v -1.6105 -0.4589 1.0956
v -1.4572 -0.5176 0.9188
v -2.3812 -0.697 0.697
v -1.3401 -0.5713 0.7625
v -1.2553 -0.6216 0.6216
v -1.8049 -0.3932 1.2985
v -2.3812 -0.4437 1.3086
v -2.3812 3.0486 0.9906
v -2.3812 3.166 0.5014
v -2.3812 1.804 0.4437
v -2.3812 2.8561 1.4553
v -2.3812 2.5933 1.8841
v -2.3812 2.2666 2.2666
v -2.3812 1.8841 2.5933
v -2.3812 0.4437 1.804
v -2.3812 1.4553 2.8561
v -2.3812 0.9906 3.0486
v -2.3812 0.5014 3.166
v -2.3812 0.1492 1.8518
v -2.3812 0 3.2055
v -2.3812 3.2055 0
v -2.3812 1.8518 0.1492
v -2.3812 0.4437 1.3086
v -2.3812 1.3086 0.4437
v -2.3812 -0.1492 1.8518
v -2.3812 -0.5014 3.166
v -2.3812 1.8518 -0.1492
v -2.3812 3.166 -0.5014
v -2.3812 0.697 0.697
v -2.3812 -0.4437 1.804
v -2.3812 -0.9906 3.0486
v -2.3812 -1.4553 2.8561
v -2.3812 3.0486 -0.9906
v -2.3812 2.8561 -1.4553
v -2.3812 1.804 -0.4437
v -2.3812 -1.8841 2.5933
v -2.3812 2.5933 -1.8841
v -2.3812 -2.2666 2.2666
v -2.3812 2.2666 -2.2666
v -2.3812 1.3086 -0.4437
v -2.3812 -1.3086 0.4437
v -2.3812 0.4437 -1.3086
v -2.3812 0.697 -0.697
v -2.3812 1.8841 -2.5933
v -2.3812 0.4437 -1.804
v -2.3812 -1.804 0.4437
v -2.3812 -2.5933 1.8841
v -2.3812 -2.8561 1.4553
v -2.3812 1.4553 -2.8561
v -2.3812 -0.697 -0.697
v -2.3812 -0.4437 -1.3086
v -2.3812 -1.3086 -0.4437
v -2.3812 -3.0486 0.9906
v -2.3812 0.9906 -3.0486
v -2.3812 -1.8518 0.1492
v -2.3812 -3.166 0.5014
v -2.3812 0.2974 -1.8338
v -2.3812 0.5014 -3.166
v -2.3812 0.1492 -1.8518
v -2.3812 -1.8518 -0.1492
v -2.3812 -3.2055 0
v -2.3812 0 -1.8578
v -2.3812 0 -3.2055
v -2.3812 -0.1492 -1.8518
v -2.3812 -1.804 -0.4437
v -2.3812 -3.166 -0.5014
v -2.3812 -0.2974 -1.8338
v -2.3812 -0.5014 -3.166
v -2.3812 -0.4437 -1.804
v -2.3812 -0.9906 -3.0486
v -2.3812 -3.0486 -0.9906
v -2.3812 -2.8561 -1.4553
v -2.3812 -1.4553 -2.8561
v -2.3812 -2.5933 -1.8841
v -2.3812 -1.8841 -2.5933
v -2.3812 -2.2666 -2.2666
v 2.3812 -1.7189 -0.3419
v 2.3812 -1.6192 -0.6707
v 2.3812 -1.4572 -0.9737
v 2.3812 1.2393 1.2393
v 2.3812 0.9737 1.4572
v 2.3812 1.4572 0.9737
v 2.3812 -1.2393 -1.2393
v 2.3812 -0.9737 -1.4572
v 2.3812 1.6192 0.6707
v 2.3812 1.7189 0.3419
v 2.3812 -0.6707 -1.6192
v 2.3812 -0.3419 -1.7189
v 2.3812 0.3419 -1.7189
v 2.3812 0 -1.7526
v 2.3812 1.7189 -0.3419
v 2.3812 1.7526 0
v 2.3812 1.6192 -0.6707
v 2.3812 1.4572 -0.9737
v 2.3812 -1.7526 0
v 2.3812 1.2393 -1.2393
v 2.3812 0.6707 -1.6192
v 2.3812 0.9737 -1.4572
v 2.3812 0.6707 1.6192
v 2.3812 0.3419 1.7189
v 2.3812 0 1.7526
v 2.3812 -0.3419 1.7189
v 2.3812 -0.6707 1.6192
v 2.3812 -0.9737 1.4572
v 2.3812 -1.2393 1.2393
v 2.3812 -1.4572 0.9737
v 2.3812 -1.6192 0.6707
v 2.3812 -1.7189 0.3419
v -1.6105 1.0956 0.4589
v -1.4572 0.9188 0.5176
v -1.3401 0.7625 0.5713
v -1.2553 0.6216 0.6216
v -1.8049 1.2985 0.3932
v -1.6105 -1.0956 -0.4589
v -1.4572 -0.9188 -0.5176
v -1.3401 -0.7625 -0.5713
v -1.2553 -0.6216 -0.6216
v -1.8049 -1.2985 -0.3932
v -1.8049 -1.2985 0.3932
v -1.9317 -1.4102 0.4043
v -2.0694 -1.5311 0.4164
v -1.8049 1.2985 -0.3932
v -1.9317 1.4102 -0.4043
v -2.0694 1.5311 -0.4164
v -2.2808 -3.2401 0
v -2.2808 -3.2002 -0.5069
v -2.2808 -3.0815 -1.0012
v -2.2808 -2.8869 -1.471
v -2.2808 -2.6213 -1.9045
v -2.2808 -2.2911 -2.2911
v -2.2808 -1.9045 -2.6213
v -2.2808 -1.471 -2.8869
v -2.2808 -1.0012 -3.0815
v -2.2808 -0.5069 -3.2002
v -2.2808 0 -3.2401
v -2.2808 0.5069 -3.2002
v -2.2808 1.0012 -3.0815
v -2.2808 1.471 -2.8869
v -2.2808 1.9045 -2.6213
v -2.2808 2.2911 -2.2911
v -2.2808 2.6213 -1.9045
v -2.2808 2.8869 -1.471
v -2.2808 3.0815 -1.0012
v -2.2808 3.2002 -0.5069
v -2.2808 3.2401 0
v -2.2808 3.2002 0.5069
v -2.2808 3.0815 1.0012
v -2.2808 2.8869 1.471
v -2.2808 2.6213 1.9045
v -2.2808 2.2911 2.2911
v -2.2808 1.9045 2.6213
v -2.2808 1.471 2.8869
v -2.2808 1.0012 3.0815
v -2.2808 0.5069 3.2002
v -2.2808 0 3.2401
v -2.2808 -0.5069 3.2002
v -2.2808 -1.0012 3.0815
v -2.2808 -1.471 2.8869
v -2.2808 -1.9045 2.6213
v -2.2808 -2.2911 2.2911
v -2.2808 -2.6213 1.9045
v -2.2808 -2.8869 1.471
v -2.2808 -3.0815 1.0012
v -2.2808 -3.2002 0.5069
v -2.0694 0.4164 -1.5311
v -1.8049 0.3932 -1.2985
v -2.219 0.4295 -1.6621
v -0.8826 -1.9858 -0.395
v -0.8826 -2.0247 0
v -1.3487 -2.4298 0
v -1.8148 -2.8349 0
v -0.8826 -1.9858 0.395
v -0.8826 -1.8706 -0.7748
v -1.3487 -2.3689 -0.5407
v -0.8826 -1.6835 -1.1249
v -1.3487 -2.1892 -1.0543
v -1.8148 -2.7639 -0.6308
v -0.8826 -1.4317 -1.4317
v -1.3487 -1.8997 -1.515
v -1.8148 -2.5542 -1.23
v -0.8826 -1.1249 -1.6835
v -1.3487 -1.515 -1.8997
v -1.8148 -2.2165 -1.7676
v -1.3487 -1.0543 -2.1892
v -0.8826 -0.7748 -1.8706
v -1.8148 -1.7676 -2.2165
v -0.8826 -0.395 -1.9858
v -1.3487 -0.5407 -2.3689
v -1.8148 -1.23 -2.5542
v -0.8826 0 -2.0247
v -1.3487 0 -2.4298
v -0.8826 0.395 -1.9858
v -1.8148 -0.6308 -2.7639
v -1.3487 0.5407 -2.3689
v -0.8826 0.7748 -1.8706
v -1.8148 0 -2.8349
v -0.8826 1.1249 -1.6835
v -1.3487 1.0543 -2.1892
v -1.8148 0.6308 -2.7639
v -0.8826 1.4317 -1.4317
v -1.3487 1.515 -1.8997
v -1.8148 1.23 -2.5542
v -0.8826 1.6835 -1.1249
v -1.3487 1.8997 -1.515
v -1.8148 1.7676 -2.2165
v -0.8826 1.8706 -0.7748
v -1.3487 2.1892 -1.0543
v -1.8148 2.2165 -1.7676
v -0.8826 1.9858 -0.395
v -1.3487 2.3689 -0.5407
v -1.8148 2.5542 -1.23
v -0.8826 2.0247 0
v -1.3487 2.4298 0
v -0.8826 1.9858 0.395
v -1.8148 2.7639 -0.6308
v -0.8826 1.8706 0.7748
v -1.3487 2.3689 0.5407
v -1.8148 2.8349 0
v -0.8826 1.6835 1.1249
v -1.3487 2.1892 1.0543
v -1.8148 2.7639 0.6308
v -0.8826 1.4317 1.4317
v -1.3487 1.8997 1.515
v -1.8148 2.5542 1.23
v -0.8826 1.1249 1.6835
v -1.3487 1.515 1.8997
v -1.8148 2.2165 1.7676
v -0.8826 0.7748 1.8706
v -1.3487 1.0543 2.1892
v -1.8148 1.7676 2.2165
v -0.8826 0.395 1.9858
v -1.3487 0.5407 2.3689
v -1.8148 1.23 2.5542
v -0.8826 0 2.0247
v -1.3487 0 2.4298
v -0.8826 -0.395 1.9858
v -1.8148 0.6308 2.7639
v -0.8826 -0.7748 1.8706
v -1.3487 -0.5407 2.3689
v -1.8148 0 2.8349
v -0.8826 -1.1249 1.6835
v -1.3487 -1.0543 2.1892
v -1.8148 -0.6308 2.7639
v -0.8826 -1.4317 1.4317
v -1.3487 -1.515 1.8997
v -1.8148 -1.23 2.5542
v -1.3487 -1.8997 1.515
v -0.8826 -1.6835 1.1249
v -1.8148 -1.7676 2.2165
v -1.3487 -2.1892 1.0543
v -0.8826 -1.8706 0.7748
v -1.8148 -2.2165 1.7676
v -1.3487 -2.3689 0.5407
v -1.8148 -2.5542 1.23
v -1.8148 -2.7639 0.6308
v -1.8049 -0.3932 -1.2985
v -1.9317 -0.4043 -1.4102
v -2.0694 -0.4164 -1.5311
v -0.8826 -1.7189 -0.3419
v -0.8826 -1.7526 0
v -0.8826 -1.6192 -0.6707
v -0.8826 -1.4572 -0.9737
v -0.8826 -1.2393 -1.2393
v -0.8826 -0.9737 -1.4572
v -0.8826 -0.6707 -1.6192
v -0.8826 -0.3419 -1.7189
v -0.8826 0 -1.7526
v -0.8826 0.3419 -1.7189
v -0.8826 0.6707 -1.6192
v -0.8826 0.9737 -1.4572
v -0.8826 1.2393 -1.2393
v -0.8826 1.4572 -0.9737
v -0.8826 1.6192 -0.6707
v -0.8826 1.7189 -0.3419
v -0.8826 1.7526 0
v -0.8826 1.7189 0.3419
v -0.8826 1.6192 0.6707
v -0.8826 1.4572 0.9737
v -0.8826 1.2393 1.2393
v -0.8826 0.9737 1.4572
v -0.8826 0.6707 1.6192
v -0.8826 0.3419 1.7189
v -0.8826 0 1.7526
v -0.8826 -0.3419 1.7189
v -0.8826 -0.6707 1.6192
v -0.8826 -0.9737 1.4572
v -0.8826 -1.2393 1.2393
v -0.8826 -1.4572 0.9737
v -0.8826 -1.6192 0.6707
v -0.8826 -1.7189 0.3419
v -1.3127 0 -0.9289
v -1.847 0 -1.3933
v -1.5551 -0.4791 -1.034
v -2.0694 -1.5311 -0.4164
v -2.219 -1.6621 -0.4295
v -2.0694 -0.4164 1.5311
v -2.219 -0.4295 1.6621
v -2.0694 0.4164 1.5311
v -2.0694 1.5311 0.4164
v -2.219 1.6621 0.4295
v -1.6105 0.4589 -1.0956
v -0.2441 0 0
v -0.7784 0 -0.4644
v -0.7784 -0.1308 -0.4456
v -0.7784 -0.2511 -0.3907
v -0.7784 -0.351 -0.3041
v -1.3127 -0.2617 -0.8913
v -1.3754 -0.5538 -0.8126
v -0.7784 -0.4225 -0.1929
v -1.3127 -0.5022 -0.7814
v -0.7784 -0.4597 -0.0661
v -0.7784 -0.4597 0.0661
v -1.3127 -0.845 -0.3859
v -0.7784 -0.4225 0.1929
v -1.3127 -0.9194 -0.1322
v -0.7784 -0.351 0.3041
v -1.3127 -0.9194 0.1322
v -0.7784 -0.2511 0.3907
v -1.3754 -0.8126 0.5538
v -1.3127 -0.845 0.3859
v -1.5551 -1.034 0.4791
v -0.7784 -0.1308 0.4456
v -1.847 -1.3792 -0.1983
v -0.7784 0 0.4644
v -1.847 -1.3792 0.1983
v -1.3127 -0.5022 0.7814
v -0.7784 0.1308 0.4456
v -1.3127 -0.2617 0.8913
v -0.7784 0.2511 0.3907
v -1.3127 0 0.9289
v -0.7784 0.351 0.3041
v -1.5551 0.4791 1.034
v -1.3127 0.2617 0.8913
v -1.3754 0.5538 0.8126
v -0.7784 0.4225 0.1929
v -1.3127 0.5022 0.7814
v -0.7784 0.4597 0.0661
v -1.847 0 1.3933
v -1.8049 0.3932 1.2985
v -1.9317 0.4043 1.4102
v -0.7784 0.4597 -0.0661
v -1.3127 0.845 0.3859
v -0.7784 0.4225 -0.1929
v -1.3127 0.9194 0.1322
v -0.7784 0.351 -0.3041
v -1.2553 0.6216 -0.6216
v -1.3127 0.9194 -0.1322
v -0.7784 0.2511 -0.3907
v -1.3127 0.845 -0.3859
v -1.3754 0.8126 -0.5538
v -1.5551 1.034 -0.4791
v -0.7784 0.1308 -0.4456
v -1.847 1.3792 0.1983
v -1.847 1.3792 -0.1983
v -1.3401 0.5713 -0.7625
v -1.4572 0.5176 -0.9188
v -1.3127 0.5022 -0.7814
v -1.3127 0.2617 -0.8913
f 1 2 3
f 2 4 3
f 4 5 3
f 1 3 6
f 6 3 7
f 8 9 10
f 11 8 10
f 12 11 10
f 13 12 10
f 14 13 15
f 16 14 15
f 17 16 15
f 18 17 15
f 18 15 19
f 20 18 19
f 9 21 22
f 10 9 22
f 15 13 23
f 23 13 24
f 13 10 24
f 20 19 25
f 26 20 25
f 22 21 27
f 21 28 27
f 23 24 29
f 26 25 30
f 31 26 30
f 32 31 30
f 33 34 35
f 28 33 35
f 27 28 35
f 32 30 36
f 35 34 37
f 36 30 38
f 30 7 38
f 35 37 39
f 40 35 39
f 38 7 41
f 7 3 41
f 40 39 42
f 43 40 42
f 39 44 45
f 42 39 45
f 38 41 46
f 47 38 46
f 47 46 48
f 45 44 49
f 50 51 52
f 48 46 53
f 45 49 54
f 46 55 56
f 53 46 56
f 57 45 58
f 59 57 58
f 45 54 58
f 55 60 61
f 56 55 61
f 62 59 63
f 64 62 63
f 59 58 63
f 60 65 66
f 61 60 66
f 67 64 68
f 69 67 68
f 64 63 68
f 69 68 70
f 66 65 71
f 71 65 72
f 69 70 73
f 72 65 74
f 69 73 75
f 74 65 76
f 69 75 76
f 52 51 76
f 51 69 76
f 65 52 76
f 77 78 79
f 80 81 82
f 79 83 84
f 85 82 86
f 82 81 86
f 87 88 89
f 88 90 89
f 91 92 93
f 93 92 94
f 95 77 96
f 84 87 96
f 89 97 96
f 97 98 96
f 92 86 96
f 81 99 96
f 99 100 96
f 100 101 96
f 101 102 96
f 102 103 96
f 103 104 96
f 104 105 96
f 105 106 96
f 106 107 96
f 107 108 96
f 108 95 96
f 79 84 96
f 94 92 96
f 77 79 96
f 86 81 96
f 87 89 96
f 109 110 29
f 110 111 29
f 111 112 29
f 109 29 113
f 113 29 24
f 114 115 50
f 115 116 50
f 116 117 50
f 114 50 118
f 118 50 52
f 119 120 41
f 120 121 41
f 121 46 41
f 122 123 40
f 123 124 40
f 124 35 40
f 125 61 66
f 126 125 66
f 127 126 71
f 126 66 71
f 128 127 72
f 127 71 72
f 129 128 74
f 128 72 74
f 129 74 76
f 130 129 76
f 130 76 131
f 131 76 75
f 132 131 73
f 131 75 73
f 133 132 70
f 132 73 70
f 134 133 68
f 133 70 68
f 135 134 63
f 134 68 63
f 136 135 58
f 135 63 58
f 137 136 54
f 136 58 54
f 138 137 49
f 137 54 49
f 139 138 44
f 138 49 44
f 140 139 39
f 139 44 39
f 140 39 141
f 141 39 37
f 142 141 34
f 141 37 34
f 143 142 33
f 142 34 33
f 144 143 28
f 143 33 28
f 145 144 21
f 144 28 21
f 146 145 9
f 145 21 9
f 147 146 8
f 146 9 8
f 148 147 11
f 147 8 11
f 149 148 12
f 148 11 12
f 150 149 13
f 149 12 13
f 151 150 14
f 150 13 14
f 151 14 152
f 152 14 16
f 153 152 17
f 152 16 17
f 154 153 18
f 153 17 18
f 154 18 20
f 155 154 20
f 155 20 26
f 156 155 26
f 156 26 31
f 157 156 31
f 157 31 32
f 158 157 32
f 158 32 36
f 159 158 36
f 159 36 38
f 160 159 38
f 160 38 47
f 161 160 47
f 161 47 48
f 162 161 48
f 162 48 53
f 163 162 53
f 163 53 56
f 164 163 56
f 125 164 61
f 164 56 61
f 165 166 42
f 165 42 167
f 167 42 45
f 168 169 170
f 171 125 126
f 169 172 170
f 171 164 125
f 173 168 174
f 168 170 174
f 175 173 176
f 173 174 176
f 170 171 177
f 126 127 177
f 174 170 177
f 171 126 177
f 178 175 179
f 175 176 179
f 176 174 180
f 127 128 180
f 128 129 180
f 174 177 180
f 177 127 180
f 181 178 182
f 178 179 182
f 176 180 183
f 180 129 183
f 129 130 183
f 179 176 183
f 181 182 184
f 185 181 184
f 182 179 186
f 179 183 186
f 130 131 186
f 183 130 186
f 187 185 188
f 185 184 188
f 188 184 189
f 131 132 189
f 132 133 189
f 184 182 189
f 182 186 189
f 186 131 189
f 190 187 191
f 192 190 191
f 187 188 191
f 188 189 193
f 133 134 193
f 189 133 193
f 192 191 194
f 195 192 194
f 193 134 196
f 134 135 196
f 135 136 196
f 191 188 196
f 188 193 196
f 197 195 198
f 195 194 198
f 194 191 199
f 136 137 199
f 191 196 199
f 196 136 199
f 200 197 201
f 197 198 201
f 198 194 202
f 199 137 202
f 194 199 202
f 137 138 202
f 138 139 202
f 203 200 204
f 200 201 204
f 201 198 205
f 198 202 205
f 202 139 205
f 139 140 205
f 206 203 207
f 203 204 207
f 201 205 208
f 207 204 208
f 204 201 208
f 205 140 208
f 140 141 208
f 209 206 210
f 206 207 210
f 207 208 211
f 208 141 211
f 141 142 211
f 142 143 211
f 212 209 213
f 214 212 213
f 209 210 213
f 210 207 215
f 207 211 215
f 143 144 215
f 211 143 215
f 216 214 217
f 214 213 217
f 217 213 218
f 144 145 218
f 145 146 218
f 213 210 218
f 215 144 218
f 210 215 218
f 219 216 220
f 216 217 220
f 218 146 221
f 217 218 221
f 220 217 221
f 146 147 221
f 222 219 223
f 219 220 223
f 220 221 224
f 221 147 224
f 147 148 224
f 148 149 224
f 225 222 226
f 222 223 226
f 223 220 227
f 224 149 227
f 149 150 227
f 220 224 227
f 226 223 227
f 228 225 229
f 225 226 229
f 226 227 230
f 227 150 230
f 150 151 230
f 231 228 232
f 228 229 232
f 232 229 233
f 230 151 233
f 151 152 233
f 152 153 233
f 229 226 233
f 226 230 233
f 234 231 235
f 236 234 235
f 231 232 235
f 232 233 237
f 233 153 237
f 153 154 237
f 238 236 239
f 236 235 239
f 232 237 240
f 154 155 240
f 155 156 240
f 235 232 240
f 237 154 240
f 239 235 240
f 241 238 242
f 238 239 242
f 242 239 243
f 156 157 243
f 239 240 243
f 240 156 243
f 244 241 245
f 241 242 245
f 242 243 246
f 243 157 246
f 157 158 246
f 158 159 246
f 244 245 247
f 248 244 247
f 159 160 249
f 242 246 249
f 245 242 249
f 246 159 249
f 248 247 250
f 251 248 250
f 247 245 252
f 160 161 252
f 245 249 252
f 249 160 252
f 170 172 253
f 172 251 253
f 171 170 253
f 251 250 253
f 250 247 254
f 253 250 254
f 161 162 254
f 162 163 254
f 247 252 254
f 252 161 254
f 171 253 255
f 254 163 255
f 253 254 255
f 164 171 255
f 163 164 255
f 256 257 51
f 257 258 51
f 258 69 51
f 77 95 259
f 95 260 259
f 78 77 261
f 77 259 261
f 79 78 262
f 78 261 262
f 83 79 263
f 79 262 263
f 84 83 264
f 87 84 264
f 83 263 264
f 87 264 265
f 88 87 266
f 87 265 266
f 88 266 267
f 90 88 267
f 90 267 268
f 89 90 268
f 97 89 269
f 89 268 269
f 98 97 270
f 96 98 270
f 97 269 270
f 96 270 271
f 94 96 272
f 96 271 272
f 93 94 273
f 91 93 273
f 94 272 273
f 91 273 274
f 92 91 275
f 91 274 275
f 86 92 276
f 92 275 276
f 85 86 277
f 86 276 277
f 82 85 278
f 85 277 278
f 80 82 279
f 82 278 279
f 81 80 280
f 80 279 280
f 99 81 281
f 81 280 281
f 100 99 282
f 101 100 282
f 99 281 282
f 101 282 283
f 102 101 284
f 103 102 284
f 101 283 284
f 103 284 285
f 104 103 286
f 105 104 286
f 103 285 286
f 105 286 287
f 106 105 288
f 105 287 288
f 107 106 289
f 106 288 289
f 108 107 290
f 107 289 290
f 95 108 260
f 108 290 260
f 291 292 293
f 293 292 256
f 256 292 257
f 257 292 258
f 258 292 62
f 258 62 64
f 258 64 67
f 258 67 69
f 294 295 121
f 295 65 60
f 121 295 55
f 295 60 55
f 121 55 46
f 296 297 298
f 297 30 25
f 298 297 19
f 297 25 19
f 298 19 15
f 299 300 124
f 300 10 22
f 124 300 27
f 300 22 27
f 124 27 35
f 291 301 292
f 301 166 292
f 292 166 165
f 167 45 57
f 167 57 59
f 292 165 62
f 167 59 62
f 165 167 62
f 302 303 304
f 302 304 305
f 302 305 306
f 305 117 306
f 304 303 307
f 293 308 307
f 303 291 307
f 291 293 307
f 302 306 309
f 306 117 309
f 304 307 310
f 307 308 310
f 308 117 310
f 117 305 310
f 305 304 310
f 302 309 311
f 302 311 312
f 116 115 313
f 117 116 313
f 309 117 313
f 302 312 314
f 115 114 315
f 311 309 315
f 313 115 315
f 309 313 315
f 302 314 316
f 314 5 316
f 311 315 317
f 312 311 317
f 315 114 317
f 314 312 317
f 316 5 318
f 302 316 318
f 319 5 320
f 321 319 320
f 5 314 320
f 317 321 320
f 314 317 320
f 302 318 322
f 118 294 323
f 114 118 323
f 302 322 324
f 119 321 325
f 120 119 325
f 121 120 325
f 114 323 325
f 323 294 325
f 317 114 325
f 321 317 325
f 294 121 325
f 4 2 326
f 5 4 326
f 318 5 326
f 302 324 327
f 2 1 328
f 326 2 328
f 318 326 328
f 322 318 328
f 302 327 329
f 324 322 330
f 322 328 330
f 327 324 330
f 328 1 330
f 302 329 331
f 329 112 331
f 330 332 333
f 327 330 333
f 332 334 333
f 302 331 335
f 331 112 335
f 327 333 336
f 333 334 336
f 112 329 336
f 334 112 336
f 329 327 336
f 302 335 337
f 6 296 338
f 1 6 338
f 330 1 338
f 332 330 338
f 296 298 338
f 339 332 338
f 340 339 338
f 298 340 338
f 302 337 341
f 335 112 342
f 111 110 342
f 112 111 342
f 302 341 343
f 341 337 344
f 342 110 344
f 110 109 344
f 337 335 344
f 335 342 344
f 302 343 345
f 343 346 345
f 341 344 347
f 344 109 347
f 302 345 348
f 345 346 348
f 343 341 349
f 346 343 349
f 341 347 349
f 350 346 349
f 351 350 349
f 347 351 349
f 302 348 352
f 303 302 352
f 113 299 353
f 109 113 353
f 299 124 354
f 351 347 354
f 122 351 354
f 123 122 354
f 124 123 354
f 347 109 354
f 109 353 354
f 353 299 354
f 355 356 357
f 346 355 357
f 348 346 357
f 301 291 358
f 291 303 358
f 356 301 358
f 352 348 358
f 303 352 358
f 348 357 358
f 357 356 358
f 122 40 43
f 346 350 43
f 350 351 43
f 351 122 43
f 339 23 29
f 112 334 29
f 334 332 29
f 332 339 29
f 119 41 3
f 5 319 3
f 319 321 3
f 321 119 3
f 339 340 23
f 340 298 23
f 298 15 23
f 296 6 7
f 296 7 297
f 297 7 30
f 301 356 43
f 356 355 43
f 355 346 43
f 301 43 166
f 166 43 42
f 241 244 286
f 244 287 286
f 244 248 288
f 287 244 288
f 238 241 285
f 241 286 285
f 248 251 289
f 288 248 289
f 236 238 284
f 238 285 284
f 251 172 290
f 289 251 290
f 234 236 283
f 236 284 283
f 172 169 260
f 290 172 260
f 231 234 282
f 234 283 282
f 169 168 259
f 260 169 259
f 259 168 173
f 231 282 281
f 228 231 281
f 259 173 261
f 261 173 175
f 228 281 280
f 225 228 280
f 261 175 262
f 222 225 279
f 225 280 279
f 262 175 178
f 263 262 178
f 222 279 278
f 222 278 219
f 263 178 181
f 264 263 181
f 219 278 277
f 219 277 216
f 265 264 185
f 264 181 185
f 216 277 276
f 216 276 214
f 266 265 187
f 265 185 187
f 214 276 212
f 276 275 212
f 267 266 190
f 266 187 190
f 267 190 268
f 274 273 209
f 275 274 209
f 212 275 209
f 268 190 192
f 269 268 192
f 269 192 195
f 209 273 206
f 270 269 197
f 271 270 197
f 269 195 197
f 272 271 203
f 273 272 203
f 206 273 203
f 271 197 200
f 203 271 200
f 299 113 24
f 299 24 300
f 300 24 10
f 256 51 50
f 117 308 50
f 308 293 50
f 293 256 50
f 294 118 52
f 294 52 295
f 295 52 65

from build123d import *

# Parameters (mm, degrees)
CUT_EXTRUDE1_REACH = 8.695
CIRPATTERN1_COUNT  = 4
DRAFT1_ANGLE       = 5
CHAMFER1_SIZE      = 0.133096
CHAMFER1_SIZE2     = 0.121906137


with BuildPart() as part:
    # Sketch2 → Revolve1 (revolve)
    with BuildSketch(Plane.XY, mode=Mode.PRIVATE) as revolve1_sk:
        Polygon((-2.38125, 0), (2.38125, 0), (2.38125, 1.7526), (-0.88265, 1.7526), (-0.88265, 2.024686895), (-2.38125, 3.3274), align=None)
    revolve(revolve1_sk.sketch.rotate(Axis((-2.38125, 0, 0), (1, 0, 0)), 180), axis=Axis((-2.38125, 0, 0), (1, 0, 0)))

    # Cut-Extrude1: up to this cone (the profile starts inside it)
    cut_extrude1_end = Plane(origin=(-2.38125, 0, 0), z_dir=(-1, 0, 0)).offset(-2.137134931) * Cone(1e-06, 11.465822401, 13.189918853, align=(Align.CENTER, Align.CENTER, Align.MIN), mode=Mode.PRIVATE)
    # Sketch3 → Cut-Extrude1 (cut, up to the surface)
    with BuildSketch(Plane.ZY.offset(2.38125), mode=Mode.PRIVATE) as cut_extrude1_sk1:
        with BuildLine():
            Line((0, 0), (2.218266667, 0))
            ThreePointArc((2.218266667, 0), (2.207033704, 0.22295568), (2.173448579, 0.443653333))
            Line((2.173448579, 0.443653333), (1.308550956, 0.443653333))
            Line((1.308550956, 0.443653333), (0.696975982, 0.696975982))
            Line((0.696975982, 0.696975982), (0.443653333, 1.308550956))
            Line((0.443653333, 1.308550956), (0.443653333, 2.173448579))
            ThreePointArc((0.443653333, 2.173448579), (0.22295568, 2.207033704), (0, 2.218266667))
            Line((0, 2.218266667), (0, 0))
        make_face()
    cut_extrude1_tool1 = extrude(cut_extrude1_sk1.sketch, amount=-CUT_EXTRUDE1_REACH, mode=Mode.PRIVATE) & cut_extrude1_end
    cut_extrude1 = cut_extrude1_tool1.solids().sort_by_distance((-2.38125, 1.109133, 0.031371))[0]
    add(cut_extrude1, mode=Mode.SUBTRACT)

    # CirPattern1: Cut-Extrude1 ×4 about axis
    cirpattern1_axis = Axis((0, 0, 0), (1, 0, 0))
    for i in range(1, CIRPATTERN1_COUNT):
        add(cut_extrude1.rotate(cirpattern1_axis, i * 360 / CIRPATTERN1_COUNT), mode=Mode.SUBTRACT)

    # Draft1
    draft1_faces = [part.faces().sort_by_distance(p)[0] for p in [
        (-2.19829002, 0.443653333, -1.474018434),
        (-1.970823894, 0.582482874, -0.973386795),
        (-1.970823894, 0.973386795, -0.582482874),
        (-2.19829002, 1.474018434, -0.443653333),
        (-2.19829002, 1.474018434, 0.443653333),
        (-1.970823894, 0.973386795, 0.582482874),
        (-1.970823894, 0.582482874, 0.973386795),
        (-2.19829002, 0.443653333, 1.474018434),
        (-2.19829002, -0.443653333, 1.474018434),
        (-1.970823894, -0.582482874, 0.973386795),
        (-1.970823894, -0.973386795, 0.582482874),
        (-2.19829002, -1.474018434, 0.443653333),
        (-2.19829002, -1.474018434, -0.443653333),
        (-1.970823894, -0.973386795, -0.582482874),
        (-1.970823894, -0.582482874, -0.973386795),
        (-2.19829002, -0.443653333, -1.474018434),
    ]]
    draft(draft1_faces, Plane(origin=(-2.38125, 0, 0), x_dir=(0, -1, 0), z_dir=(-1, 0, 0)), DRAFT1_ANGLE)

    # Chamfer1
    chamfer1_edges = [part.edges().sort_by_distance(p)[0] for p in [
        (-2.38125, 3.3274, 0),
    ]]
    chamfer1_side = [part.faces().sort_by_distance(p)[0] for p in [
        (-1.63195, 2.676043447, 0),
    ]]
    chamfer(chamfer1_edges, length=CHAMFER1_SIZE, length2=CHAMFER1_SIZE2, reference=chamfer1_side[0])


solid = part.part
